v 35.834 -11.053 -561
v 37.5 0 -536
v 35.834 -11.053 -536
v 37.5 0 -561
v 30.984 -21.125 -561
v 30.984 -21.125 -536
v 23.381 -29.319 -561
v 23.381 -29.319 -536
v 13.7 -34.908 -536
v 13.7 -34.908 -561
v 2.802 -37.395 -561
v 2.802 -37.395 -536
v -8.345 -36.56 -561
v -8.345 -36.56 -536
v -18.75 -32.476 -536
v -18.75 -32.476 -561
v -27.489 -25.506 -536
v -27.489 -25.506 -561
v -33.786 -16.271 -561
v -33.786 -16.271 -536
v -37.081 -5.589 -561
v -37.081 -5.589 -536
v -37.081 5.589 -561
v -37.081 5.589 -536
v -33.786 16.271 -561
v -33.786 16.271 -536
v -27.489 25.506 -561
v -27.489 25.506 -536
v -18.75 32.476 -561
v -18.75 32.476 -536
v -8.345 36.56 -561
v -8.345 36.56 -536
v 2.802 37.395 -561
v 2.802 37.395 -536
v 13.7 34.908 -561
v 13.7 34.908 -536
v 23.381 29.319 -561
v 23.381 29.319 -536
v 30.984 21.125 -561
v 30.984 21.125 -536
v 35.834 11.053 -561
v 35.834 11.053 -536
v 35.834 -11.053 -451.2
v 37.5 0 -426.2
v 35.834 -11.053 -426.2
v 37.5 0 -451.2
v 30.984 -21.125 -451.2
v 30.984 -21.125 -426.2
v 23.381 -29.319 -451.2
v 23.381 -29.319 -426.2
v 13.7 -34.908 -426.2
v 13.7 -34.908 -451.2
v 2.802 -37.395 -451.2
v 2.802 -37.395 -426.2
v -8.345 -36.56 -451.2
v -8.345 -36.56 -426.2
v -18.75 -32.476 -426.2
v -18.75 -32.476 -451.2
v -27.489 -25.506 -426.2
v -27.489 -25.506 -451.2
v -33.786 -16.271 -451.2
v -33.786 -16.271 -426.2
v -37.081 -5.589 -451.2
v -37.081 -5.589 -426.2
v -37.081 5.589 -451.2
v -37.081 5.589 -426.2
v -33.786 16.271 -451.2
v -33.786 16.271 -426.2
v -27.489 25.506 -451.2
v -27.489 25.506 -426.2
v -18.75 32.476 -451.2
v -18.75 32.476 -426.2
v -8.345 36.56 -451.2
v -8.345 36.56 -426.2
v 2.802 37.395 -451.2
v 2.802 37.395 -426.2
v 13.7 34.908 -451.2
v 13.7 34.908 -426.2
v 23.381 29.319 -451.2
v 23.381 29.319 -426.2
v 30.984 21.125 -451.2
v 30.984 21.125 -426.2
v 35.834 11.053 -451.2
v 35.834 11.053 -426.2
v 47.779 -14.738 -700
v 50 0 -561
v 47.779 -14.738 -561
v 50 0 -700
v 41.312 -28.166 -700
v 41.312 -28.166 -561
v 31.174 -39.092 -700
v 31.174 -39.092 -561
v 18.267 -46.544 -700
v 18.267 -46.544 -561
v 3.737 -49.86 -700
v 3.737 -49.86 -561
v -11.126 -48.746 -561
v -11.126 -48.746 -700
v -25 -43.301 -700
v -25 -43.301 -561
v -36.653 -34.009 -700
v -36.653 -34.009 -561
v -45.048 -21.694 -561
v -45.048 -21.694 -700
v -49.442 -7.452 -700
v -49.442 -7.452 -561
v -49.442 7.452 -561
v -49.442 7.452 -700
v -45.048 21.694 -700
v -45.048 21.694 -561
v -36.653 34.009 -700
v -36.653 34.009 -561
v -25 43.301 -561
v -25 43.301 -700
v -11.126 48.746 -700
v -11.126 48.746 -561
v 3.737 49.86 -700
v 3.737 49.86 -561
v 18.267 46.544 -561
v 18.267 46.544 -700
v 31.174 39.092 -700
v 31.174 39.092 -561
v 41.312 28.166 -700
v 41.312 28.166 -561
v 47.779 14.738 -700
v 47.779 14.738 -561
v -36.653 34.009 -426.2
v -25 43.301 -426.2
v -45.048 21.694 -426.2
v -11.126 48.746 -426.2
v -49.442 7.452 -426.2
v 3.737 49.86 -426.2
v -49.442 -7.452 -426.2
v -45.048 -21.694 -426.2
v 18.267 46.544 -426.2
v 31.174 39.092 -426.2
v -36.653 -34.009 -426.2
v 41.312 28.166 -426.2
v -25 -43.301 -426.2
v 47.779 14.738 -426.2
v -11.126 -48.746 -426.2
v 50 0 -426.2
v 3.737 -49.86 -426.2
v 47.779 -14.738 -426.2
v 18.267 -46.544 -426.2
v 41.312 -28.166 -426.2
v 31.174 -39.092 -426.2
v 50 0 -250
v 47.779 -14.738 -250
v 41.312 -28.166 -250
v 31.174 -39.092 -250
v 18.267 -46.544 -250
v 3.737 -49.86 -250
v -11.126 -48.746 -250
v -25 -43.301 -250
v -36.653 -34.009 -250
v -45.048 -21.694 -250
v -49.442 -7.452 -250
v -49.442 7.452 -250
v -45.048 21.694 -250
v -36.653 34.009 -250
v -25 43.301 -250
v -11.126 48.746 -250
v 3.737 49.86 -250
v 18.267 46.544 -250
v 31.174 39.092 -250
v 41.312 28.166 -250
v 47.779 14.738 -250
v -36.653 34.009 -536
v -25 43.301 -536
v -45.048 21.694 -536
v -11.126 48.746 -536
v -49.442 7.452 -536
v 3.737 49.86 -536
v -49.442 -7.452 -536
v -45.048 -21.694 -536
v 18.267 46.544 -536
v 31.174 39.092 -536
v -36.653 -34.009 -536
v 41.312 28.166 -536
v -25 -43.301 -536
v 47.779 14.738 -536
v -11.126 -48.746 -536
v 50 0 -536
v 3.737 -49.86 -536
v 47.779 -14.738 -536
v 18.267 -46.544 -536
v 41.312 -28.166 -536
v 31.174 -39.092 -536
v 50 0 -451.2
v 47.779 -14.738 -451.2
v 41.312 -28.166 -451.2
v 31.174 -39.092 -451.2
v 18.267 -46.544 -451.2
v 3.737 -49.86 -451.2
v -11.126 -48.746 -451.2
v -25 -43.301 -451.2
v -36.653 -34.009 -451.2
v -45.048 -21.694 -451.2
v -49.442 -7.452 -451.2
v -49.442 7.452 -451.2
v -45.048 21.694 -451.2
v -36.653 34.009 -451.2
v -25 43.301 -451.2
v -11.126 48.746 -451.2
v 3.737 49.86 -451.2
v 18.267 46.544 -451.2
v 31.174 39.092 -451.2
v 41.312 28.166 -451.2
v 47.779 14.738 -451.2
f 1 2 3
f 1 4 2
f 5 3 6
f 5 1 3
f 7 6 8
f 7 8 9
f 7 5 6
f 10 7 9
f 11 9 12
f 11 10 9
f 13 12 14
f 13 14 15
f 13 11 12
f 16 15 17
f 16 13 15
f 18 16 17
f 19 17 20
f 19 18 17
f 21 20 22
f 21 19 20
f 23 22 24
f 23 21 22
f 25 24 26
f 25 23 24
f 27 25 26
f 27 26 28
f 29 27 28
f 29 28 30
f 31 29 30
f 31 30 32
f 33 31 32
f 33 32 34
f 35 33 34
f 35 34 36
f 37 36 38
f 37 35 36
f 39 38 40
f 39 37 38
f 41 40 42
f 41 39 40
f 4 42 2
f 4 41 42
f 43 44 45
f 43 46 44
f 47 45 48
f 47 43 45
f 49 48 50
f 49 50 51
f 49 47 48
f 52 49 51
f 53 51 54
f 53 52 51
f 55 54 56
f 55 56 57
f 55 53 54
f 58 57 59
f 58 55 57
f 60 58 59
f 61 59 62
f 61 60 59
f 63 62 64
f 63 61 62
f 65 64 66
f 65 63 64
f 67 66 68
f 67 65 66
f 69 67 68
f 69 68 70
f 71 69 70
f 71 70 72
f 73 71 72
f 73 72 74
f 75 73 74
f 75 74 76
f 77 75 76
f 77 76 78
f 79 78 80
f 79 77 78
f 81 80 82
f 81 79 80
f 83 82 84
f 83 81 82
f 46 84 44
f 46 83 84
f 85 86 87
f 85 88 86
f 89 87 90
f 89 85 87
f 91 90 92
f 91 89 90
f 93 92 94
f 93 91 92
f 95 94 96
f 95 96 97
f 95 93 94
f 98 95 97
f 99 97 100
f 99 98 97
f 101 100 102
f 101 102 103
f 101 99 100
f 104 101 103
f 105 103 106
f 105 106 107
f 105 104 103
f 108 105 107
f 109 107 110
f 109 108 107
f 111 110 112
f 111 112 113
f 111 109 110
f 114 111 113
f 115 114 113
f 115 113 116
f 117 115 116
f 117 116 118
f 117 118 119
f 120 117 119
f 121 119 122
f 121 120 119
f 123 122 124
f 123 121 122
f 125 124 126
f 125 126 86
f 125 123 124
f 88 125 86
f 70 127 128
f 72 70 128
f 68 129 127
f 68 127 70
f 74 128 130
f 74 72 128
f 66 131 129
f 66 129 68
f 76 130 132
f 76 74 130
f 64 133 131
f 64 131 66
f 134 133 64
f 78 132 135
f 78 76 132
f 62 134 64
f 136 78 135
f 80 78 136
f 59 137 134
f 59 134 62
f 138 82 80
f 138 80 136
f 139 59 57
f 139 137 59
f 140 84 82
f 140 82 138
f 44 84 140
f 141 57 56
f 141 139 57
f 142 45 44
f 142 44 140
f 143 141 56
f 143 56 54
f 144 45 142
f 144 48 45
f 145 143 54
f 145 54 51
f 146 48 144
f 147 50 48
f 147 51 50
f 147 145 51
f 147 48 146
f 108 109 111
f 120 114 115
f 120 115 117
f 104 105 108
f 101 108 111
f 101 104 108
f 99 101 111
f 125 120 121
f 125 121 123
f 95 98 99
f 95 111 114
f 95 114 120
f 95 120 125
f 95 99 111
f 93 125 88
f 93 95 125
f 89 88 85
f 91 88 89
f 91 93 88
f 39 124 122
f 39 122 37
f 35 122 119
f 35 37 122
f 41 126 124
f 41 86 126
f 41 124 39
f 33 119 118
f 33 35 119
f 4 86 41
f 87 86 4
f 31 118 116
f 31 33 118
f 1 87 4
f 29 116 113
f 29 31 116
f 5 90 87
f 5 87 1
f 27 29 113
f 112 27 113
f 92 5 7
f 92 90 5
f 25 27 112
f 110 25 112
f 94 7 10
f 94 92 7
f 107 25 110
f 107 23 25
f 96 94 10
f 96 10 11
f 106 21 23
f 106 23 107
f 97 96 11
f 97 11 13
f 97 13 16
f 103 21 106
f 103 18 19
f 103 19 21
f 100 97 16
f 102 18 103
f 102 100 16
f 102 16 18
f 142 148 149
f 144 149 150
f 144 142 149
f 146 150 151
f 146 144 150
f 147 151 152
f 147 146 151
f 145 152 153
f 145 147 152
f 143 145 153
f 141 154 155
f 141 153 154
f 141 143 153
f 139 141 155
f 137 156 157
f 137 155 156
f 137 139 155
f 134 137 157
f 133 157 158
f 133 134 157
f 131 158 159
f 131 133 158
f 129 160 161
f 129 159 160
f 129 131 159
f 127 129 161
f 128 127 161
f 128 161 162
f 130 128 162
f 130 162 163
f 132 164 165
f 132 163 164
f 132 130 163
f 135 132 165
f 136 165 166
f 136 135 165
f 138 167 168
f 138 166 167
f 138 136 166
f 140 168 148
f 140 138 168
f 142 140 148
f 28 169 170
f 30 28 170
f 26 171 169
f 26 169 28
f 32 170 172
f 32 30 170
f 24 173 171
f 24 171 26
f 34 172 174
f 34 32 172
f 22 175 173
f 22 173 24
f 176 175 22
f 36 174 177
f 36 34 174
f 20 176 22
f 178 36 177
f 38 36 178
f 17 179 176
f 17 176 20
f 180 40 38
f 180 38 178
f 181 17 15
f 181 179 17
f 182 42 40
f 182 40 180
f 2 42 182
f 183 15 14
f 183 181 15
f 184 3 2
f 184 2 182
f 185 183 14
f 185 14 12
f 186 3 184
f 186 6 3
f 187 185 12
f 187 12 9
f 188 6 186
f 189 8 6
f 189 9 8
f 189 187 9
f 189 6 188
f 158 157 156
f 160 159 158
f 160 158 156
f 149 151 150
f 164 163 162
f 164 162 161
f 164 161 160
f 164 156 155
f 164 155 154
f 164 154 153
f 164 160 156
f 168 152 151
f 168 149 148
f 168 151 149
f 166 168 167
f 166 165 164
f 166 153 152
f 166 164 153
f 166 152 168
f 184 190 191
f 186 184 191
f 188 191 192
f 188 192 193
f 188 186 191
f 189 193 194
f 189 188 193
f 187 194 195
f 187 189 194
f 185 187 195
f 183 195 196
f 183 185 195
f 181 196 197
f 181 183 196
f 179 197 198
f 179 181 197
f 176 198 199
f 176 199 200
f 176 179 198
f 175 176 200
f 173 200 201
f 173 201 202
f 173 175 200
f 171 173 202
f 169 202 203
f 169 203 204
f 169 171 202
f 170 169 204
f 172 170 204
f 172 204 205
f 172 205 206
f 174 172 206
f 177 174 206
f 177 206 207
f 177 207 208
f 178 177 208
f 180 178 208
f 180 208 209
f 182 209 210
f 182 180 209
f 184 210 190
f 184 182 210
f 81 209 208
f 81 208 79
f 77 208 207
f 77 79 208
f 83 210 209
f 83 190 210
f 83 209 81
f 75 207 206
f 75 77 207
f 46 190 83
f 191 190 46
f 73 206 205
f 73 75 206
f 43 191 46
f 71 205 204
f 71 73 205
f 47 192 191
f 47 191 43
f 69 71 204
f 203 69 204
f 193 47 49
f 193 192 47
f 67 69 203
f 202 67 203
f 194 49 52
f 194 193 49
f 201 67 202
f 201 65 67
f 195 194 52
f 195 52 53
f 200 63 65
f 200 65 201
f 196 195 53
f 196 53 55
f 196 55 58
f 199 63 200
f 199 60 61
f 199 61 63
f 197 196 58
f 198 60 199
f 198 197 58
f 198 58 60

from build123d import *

# Parameters (mm, degrees)
CUT_EXTRUDE1_START = -250
SKETCH3_R          = 50
CUT_EXTRUDE1_DEPTH = 250


with BuildPart() as part:
    # Sketch2 → Revolve1 (revolve)
    with BuildSketch(Plane(origin=(0, 0, 0), x_dir=(0, 0, -1), z_dir=(1, 0, 0)), mode=Mode.PRIVATE) as revolve1_sk:
        Polygon((0, 0), (0, 50), (426.2, 50), (426.2, 37.5), (451.2, 37.5), (451.2, 50), (536, 50), (536, 37.5), (561, 37.5), (561, 50), (700, 50), (700, 0), align=None)
    revolve(revolve1_sk.sketch.rotate(Axis((0, 0, 0), (0, 0, -1)), 90), axis=Axis((0, 0, 0), (0, 0, -1)))

    # Sketch3 → Cut-Extrude1 (cut)
    with BuildSketch(Plane.XY.offset(CUT_EXTRUDE1_START)):
        Circle(SKETCH3_R)
    extrude(amount=CUT_EXTRUDE1_DEPTH, mode=Mode.SUBTRACT)


solid = part.part
